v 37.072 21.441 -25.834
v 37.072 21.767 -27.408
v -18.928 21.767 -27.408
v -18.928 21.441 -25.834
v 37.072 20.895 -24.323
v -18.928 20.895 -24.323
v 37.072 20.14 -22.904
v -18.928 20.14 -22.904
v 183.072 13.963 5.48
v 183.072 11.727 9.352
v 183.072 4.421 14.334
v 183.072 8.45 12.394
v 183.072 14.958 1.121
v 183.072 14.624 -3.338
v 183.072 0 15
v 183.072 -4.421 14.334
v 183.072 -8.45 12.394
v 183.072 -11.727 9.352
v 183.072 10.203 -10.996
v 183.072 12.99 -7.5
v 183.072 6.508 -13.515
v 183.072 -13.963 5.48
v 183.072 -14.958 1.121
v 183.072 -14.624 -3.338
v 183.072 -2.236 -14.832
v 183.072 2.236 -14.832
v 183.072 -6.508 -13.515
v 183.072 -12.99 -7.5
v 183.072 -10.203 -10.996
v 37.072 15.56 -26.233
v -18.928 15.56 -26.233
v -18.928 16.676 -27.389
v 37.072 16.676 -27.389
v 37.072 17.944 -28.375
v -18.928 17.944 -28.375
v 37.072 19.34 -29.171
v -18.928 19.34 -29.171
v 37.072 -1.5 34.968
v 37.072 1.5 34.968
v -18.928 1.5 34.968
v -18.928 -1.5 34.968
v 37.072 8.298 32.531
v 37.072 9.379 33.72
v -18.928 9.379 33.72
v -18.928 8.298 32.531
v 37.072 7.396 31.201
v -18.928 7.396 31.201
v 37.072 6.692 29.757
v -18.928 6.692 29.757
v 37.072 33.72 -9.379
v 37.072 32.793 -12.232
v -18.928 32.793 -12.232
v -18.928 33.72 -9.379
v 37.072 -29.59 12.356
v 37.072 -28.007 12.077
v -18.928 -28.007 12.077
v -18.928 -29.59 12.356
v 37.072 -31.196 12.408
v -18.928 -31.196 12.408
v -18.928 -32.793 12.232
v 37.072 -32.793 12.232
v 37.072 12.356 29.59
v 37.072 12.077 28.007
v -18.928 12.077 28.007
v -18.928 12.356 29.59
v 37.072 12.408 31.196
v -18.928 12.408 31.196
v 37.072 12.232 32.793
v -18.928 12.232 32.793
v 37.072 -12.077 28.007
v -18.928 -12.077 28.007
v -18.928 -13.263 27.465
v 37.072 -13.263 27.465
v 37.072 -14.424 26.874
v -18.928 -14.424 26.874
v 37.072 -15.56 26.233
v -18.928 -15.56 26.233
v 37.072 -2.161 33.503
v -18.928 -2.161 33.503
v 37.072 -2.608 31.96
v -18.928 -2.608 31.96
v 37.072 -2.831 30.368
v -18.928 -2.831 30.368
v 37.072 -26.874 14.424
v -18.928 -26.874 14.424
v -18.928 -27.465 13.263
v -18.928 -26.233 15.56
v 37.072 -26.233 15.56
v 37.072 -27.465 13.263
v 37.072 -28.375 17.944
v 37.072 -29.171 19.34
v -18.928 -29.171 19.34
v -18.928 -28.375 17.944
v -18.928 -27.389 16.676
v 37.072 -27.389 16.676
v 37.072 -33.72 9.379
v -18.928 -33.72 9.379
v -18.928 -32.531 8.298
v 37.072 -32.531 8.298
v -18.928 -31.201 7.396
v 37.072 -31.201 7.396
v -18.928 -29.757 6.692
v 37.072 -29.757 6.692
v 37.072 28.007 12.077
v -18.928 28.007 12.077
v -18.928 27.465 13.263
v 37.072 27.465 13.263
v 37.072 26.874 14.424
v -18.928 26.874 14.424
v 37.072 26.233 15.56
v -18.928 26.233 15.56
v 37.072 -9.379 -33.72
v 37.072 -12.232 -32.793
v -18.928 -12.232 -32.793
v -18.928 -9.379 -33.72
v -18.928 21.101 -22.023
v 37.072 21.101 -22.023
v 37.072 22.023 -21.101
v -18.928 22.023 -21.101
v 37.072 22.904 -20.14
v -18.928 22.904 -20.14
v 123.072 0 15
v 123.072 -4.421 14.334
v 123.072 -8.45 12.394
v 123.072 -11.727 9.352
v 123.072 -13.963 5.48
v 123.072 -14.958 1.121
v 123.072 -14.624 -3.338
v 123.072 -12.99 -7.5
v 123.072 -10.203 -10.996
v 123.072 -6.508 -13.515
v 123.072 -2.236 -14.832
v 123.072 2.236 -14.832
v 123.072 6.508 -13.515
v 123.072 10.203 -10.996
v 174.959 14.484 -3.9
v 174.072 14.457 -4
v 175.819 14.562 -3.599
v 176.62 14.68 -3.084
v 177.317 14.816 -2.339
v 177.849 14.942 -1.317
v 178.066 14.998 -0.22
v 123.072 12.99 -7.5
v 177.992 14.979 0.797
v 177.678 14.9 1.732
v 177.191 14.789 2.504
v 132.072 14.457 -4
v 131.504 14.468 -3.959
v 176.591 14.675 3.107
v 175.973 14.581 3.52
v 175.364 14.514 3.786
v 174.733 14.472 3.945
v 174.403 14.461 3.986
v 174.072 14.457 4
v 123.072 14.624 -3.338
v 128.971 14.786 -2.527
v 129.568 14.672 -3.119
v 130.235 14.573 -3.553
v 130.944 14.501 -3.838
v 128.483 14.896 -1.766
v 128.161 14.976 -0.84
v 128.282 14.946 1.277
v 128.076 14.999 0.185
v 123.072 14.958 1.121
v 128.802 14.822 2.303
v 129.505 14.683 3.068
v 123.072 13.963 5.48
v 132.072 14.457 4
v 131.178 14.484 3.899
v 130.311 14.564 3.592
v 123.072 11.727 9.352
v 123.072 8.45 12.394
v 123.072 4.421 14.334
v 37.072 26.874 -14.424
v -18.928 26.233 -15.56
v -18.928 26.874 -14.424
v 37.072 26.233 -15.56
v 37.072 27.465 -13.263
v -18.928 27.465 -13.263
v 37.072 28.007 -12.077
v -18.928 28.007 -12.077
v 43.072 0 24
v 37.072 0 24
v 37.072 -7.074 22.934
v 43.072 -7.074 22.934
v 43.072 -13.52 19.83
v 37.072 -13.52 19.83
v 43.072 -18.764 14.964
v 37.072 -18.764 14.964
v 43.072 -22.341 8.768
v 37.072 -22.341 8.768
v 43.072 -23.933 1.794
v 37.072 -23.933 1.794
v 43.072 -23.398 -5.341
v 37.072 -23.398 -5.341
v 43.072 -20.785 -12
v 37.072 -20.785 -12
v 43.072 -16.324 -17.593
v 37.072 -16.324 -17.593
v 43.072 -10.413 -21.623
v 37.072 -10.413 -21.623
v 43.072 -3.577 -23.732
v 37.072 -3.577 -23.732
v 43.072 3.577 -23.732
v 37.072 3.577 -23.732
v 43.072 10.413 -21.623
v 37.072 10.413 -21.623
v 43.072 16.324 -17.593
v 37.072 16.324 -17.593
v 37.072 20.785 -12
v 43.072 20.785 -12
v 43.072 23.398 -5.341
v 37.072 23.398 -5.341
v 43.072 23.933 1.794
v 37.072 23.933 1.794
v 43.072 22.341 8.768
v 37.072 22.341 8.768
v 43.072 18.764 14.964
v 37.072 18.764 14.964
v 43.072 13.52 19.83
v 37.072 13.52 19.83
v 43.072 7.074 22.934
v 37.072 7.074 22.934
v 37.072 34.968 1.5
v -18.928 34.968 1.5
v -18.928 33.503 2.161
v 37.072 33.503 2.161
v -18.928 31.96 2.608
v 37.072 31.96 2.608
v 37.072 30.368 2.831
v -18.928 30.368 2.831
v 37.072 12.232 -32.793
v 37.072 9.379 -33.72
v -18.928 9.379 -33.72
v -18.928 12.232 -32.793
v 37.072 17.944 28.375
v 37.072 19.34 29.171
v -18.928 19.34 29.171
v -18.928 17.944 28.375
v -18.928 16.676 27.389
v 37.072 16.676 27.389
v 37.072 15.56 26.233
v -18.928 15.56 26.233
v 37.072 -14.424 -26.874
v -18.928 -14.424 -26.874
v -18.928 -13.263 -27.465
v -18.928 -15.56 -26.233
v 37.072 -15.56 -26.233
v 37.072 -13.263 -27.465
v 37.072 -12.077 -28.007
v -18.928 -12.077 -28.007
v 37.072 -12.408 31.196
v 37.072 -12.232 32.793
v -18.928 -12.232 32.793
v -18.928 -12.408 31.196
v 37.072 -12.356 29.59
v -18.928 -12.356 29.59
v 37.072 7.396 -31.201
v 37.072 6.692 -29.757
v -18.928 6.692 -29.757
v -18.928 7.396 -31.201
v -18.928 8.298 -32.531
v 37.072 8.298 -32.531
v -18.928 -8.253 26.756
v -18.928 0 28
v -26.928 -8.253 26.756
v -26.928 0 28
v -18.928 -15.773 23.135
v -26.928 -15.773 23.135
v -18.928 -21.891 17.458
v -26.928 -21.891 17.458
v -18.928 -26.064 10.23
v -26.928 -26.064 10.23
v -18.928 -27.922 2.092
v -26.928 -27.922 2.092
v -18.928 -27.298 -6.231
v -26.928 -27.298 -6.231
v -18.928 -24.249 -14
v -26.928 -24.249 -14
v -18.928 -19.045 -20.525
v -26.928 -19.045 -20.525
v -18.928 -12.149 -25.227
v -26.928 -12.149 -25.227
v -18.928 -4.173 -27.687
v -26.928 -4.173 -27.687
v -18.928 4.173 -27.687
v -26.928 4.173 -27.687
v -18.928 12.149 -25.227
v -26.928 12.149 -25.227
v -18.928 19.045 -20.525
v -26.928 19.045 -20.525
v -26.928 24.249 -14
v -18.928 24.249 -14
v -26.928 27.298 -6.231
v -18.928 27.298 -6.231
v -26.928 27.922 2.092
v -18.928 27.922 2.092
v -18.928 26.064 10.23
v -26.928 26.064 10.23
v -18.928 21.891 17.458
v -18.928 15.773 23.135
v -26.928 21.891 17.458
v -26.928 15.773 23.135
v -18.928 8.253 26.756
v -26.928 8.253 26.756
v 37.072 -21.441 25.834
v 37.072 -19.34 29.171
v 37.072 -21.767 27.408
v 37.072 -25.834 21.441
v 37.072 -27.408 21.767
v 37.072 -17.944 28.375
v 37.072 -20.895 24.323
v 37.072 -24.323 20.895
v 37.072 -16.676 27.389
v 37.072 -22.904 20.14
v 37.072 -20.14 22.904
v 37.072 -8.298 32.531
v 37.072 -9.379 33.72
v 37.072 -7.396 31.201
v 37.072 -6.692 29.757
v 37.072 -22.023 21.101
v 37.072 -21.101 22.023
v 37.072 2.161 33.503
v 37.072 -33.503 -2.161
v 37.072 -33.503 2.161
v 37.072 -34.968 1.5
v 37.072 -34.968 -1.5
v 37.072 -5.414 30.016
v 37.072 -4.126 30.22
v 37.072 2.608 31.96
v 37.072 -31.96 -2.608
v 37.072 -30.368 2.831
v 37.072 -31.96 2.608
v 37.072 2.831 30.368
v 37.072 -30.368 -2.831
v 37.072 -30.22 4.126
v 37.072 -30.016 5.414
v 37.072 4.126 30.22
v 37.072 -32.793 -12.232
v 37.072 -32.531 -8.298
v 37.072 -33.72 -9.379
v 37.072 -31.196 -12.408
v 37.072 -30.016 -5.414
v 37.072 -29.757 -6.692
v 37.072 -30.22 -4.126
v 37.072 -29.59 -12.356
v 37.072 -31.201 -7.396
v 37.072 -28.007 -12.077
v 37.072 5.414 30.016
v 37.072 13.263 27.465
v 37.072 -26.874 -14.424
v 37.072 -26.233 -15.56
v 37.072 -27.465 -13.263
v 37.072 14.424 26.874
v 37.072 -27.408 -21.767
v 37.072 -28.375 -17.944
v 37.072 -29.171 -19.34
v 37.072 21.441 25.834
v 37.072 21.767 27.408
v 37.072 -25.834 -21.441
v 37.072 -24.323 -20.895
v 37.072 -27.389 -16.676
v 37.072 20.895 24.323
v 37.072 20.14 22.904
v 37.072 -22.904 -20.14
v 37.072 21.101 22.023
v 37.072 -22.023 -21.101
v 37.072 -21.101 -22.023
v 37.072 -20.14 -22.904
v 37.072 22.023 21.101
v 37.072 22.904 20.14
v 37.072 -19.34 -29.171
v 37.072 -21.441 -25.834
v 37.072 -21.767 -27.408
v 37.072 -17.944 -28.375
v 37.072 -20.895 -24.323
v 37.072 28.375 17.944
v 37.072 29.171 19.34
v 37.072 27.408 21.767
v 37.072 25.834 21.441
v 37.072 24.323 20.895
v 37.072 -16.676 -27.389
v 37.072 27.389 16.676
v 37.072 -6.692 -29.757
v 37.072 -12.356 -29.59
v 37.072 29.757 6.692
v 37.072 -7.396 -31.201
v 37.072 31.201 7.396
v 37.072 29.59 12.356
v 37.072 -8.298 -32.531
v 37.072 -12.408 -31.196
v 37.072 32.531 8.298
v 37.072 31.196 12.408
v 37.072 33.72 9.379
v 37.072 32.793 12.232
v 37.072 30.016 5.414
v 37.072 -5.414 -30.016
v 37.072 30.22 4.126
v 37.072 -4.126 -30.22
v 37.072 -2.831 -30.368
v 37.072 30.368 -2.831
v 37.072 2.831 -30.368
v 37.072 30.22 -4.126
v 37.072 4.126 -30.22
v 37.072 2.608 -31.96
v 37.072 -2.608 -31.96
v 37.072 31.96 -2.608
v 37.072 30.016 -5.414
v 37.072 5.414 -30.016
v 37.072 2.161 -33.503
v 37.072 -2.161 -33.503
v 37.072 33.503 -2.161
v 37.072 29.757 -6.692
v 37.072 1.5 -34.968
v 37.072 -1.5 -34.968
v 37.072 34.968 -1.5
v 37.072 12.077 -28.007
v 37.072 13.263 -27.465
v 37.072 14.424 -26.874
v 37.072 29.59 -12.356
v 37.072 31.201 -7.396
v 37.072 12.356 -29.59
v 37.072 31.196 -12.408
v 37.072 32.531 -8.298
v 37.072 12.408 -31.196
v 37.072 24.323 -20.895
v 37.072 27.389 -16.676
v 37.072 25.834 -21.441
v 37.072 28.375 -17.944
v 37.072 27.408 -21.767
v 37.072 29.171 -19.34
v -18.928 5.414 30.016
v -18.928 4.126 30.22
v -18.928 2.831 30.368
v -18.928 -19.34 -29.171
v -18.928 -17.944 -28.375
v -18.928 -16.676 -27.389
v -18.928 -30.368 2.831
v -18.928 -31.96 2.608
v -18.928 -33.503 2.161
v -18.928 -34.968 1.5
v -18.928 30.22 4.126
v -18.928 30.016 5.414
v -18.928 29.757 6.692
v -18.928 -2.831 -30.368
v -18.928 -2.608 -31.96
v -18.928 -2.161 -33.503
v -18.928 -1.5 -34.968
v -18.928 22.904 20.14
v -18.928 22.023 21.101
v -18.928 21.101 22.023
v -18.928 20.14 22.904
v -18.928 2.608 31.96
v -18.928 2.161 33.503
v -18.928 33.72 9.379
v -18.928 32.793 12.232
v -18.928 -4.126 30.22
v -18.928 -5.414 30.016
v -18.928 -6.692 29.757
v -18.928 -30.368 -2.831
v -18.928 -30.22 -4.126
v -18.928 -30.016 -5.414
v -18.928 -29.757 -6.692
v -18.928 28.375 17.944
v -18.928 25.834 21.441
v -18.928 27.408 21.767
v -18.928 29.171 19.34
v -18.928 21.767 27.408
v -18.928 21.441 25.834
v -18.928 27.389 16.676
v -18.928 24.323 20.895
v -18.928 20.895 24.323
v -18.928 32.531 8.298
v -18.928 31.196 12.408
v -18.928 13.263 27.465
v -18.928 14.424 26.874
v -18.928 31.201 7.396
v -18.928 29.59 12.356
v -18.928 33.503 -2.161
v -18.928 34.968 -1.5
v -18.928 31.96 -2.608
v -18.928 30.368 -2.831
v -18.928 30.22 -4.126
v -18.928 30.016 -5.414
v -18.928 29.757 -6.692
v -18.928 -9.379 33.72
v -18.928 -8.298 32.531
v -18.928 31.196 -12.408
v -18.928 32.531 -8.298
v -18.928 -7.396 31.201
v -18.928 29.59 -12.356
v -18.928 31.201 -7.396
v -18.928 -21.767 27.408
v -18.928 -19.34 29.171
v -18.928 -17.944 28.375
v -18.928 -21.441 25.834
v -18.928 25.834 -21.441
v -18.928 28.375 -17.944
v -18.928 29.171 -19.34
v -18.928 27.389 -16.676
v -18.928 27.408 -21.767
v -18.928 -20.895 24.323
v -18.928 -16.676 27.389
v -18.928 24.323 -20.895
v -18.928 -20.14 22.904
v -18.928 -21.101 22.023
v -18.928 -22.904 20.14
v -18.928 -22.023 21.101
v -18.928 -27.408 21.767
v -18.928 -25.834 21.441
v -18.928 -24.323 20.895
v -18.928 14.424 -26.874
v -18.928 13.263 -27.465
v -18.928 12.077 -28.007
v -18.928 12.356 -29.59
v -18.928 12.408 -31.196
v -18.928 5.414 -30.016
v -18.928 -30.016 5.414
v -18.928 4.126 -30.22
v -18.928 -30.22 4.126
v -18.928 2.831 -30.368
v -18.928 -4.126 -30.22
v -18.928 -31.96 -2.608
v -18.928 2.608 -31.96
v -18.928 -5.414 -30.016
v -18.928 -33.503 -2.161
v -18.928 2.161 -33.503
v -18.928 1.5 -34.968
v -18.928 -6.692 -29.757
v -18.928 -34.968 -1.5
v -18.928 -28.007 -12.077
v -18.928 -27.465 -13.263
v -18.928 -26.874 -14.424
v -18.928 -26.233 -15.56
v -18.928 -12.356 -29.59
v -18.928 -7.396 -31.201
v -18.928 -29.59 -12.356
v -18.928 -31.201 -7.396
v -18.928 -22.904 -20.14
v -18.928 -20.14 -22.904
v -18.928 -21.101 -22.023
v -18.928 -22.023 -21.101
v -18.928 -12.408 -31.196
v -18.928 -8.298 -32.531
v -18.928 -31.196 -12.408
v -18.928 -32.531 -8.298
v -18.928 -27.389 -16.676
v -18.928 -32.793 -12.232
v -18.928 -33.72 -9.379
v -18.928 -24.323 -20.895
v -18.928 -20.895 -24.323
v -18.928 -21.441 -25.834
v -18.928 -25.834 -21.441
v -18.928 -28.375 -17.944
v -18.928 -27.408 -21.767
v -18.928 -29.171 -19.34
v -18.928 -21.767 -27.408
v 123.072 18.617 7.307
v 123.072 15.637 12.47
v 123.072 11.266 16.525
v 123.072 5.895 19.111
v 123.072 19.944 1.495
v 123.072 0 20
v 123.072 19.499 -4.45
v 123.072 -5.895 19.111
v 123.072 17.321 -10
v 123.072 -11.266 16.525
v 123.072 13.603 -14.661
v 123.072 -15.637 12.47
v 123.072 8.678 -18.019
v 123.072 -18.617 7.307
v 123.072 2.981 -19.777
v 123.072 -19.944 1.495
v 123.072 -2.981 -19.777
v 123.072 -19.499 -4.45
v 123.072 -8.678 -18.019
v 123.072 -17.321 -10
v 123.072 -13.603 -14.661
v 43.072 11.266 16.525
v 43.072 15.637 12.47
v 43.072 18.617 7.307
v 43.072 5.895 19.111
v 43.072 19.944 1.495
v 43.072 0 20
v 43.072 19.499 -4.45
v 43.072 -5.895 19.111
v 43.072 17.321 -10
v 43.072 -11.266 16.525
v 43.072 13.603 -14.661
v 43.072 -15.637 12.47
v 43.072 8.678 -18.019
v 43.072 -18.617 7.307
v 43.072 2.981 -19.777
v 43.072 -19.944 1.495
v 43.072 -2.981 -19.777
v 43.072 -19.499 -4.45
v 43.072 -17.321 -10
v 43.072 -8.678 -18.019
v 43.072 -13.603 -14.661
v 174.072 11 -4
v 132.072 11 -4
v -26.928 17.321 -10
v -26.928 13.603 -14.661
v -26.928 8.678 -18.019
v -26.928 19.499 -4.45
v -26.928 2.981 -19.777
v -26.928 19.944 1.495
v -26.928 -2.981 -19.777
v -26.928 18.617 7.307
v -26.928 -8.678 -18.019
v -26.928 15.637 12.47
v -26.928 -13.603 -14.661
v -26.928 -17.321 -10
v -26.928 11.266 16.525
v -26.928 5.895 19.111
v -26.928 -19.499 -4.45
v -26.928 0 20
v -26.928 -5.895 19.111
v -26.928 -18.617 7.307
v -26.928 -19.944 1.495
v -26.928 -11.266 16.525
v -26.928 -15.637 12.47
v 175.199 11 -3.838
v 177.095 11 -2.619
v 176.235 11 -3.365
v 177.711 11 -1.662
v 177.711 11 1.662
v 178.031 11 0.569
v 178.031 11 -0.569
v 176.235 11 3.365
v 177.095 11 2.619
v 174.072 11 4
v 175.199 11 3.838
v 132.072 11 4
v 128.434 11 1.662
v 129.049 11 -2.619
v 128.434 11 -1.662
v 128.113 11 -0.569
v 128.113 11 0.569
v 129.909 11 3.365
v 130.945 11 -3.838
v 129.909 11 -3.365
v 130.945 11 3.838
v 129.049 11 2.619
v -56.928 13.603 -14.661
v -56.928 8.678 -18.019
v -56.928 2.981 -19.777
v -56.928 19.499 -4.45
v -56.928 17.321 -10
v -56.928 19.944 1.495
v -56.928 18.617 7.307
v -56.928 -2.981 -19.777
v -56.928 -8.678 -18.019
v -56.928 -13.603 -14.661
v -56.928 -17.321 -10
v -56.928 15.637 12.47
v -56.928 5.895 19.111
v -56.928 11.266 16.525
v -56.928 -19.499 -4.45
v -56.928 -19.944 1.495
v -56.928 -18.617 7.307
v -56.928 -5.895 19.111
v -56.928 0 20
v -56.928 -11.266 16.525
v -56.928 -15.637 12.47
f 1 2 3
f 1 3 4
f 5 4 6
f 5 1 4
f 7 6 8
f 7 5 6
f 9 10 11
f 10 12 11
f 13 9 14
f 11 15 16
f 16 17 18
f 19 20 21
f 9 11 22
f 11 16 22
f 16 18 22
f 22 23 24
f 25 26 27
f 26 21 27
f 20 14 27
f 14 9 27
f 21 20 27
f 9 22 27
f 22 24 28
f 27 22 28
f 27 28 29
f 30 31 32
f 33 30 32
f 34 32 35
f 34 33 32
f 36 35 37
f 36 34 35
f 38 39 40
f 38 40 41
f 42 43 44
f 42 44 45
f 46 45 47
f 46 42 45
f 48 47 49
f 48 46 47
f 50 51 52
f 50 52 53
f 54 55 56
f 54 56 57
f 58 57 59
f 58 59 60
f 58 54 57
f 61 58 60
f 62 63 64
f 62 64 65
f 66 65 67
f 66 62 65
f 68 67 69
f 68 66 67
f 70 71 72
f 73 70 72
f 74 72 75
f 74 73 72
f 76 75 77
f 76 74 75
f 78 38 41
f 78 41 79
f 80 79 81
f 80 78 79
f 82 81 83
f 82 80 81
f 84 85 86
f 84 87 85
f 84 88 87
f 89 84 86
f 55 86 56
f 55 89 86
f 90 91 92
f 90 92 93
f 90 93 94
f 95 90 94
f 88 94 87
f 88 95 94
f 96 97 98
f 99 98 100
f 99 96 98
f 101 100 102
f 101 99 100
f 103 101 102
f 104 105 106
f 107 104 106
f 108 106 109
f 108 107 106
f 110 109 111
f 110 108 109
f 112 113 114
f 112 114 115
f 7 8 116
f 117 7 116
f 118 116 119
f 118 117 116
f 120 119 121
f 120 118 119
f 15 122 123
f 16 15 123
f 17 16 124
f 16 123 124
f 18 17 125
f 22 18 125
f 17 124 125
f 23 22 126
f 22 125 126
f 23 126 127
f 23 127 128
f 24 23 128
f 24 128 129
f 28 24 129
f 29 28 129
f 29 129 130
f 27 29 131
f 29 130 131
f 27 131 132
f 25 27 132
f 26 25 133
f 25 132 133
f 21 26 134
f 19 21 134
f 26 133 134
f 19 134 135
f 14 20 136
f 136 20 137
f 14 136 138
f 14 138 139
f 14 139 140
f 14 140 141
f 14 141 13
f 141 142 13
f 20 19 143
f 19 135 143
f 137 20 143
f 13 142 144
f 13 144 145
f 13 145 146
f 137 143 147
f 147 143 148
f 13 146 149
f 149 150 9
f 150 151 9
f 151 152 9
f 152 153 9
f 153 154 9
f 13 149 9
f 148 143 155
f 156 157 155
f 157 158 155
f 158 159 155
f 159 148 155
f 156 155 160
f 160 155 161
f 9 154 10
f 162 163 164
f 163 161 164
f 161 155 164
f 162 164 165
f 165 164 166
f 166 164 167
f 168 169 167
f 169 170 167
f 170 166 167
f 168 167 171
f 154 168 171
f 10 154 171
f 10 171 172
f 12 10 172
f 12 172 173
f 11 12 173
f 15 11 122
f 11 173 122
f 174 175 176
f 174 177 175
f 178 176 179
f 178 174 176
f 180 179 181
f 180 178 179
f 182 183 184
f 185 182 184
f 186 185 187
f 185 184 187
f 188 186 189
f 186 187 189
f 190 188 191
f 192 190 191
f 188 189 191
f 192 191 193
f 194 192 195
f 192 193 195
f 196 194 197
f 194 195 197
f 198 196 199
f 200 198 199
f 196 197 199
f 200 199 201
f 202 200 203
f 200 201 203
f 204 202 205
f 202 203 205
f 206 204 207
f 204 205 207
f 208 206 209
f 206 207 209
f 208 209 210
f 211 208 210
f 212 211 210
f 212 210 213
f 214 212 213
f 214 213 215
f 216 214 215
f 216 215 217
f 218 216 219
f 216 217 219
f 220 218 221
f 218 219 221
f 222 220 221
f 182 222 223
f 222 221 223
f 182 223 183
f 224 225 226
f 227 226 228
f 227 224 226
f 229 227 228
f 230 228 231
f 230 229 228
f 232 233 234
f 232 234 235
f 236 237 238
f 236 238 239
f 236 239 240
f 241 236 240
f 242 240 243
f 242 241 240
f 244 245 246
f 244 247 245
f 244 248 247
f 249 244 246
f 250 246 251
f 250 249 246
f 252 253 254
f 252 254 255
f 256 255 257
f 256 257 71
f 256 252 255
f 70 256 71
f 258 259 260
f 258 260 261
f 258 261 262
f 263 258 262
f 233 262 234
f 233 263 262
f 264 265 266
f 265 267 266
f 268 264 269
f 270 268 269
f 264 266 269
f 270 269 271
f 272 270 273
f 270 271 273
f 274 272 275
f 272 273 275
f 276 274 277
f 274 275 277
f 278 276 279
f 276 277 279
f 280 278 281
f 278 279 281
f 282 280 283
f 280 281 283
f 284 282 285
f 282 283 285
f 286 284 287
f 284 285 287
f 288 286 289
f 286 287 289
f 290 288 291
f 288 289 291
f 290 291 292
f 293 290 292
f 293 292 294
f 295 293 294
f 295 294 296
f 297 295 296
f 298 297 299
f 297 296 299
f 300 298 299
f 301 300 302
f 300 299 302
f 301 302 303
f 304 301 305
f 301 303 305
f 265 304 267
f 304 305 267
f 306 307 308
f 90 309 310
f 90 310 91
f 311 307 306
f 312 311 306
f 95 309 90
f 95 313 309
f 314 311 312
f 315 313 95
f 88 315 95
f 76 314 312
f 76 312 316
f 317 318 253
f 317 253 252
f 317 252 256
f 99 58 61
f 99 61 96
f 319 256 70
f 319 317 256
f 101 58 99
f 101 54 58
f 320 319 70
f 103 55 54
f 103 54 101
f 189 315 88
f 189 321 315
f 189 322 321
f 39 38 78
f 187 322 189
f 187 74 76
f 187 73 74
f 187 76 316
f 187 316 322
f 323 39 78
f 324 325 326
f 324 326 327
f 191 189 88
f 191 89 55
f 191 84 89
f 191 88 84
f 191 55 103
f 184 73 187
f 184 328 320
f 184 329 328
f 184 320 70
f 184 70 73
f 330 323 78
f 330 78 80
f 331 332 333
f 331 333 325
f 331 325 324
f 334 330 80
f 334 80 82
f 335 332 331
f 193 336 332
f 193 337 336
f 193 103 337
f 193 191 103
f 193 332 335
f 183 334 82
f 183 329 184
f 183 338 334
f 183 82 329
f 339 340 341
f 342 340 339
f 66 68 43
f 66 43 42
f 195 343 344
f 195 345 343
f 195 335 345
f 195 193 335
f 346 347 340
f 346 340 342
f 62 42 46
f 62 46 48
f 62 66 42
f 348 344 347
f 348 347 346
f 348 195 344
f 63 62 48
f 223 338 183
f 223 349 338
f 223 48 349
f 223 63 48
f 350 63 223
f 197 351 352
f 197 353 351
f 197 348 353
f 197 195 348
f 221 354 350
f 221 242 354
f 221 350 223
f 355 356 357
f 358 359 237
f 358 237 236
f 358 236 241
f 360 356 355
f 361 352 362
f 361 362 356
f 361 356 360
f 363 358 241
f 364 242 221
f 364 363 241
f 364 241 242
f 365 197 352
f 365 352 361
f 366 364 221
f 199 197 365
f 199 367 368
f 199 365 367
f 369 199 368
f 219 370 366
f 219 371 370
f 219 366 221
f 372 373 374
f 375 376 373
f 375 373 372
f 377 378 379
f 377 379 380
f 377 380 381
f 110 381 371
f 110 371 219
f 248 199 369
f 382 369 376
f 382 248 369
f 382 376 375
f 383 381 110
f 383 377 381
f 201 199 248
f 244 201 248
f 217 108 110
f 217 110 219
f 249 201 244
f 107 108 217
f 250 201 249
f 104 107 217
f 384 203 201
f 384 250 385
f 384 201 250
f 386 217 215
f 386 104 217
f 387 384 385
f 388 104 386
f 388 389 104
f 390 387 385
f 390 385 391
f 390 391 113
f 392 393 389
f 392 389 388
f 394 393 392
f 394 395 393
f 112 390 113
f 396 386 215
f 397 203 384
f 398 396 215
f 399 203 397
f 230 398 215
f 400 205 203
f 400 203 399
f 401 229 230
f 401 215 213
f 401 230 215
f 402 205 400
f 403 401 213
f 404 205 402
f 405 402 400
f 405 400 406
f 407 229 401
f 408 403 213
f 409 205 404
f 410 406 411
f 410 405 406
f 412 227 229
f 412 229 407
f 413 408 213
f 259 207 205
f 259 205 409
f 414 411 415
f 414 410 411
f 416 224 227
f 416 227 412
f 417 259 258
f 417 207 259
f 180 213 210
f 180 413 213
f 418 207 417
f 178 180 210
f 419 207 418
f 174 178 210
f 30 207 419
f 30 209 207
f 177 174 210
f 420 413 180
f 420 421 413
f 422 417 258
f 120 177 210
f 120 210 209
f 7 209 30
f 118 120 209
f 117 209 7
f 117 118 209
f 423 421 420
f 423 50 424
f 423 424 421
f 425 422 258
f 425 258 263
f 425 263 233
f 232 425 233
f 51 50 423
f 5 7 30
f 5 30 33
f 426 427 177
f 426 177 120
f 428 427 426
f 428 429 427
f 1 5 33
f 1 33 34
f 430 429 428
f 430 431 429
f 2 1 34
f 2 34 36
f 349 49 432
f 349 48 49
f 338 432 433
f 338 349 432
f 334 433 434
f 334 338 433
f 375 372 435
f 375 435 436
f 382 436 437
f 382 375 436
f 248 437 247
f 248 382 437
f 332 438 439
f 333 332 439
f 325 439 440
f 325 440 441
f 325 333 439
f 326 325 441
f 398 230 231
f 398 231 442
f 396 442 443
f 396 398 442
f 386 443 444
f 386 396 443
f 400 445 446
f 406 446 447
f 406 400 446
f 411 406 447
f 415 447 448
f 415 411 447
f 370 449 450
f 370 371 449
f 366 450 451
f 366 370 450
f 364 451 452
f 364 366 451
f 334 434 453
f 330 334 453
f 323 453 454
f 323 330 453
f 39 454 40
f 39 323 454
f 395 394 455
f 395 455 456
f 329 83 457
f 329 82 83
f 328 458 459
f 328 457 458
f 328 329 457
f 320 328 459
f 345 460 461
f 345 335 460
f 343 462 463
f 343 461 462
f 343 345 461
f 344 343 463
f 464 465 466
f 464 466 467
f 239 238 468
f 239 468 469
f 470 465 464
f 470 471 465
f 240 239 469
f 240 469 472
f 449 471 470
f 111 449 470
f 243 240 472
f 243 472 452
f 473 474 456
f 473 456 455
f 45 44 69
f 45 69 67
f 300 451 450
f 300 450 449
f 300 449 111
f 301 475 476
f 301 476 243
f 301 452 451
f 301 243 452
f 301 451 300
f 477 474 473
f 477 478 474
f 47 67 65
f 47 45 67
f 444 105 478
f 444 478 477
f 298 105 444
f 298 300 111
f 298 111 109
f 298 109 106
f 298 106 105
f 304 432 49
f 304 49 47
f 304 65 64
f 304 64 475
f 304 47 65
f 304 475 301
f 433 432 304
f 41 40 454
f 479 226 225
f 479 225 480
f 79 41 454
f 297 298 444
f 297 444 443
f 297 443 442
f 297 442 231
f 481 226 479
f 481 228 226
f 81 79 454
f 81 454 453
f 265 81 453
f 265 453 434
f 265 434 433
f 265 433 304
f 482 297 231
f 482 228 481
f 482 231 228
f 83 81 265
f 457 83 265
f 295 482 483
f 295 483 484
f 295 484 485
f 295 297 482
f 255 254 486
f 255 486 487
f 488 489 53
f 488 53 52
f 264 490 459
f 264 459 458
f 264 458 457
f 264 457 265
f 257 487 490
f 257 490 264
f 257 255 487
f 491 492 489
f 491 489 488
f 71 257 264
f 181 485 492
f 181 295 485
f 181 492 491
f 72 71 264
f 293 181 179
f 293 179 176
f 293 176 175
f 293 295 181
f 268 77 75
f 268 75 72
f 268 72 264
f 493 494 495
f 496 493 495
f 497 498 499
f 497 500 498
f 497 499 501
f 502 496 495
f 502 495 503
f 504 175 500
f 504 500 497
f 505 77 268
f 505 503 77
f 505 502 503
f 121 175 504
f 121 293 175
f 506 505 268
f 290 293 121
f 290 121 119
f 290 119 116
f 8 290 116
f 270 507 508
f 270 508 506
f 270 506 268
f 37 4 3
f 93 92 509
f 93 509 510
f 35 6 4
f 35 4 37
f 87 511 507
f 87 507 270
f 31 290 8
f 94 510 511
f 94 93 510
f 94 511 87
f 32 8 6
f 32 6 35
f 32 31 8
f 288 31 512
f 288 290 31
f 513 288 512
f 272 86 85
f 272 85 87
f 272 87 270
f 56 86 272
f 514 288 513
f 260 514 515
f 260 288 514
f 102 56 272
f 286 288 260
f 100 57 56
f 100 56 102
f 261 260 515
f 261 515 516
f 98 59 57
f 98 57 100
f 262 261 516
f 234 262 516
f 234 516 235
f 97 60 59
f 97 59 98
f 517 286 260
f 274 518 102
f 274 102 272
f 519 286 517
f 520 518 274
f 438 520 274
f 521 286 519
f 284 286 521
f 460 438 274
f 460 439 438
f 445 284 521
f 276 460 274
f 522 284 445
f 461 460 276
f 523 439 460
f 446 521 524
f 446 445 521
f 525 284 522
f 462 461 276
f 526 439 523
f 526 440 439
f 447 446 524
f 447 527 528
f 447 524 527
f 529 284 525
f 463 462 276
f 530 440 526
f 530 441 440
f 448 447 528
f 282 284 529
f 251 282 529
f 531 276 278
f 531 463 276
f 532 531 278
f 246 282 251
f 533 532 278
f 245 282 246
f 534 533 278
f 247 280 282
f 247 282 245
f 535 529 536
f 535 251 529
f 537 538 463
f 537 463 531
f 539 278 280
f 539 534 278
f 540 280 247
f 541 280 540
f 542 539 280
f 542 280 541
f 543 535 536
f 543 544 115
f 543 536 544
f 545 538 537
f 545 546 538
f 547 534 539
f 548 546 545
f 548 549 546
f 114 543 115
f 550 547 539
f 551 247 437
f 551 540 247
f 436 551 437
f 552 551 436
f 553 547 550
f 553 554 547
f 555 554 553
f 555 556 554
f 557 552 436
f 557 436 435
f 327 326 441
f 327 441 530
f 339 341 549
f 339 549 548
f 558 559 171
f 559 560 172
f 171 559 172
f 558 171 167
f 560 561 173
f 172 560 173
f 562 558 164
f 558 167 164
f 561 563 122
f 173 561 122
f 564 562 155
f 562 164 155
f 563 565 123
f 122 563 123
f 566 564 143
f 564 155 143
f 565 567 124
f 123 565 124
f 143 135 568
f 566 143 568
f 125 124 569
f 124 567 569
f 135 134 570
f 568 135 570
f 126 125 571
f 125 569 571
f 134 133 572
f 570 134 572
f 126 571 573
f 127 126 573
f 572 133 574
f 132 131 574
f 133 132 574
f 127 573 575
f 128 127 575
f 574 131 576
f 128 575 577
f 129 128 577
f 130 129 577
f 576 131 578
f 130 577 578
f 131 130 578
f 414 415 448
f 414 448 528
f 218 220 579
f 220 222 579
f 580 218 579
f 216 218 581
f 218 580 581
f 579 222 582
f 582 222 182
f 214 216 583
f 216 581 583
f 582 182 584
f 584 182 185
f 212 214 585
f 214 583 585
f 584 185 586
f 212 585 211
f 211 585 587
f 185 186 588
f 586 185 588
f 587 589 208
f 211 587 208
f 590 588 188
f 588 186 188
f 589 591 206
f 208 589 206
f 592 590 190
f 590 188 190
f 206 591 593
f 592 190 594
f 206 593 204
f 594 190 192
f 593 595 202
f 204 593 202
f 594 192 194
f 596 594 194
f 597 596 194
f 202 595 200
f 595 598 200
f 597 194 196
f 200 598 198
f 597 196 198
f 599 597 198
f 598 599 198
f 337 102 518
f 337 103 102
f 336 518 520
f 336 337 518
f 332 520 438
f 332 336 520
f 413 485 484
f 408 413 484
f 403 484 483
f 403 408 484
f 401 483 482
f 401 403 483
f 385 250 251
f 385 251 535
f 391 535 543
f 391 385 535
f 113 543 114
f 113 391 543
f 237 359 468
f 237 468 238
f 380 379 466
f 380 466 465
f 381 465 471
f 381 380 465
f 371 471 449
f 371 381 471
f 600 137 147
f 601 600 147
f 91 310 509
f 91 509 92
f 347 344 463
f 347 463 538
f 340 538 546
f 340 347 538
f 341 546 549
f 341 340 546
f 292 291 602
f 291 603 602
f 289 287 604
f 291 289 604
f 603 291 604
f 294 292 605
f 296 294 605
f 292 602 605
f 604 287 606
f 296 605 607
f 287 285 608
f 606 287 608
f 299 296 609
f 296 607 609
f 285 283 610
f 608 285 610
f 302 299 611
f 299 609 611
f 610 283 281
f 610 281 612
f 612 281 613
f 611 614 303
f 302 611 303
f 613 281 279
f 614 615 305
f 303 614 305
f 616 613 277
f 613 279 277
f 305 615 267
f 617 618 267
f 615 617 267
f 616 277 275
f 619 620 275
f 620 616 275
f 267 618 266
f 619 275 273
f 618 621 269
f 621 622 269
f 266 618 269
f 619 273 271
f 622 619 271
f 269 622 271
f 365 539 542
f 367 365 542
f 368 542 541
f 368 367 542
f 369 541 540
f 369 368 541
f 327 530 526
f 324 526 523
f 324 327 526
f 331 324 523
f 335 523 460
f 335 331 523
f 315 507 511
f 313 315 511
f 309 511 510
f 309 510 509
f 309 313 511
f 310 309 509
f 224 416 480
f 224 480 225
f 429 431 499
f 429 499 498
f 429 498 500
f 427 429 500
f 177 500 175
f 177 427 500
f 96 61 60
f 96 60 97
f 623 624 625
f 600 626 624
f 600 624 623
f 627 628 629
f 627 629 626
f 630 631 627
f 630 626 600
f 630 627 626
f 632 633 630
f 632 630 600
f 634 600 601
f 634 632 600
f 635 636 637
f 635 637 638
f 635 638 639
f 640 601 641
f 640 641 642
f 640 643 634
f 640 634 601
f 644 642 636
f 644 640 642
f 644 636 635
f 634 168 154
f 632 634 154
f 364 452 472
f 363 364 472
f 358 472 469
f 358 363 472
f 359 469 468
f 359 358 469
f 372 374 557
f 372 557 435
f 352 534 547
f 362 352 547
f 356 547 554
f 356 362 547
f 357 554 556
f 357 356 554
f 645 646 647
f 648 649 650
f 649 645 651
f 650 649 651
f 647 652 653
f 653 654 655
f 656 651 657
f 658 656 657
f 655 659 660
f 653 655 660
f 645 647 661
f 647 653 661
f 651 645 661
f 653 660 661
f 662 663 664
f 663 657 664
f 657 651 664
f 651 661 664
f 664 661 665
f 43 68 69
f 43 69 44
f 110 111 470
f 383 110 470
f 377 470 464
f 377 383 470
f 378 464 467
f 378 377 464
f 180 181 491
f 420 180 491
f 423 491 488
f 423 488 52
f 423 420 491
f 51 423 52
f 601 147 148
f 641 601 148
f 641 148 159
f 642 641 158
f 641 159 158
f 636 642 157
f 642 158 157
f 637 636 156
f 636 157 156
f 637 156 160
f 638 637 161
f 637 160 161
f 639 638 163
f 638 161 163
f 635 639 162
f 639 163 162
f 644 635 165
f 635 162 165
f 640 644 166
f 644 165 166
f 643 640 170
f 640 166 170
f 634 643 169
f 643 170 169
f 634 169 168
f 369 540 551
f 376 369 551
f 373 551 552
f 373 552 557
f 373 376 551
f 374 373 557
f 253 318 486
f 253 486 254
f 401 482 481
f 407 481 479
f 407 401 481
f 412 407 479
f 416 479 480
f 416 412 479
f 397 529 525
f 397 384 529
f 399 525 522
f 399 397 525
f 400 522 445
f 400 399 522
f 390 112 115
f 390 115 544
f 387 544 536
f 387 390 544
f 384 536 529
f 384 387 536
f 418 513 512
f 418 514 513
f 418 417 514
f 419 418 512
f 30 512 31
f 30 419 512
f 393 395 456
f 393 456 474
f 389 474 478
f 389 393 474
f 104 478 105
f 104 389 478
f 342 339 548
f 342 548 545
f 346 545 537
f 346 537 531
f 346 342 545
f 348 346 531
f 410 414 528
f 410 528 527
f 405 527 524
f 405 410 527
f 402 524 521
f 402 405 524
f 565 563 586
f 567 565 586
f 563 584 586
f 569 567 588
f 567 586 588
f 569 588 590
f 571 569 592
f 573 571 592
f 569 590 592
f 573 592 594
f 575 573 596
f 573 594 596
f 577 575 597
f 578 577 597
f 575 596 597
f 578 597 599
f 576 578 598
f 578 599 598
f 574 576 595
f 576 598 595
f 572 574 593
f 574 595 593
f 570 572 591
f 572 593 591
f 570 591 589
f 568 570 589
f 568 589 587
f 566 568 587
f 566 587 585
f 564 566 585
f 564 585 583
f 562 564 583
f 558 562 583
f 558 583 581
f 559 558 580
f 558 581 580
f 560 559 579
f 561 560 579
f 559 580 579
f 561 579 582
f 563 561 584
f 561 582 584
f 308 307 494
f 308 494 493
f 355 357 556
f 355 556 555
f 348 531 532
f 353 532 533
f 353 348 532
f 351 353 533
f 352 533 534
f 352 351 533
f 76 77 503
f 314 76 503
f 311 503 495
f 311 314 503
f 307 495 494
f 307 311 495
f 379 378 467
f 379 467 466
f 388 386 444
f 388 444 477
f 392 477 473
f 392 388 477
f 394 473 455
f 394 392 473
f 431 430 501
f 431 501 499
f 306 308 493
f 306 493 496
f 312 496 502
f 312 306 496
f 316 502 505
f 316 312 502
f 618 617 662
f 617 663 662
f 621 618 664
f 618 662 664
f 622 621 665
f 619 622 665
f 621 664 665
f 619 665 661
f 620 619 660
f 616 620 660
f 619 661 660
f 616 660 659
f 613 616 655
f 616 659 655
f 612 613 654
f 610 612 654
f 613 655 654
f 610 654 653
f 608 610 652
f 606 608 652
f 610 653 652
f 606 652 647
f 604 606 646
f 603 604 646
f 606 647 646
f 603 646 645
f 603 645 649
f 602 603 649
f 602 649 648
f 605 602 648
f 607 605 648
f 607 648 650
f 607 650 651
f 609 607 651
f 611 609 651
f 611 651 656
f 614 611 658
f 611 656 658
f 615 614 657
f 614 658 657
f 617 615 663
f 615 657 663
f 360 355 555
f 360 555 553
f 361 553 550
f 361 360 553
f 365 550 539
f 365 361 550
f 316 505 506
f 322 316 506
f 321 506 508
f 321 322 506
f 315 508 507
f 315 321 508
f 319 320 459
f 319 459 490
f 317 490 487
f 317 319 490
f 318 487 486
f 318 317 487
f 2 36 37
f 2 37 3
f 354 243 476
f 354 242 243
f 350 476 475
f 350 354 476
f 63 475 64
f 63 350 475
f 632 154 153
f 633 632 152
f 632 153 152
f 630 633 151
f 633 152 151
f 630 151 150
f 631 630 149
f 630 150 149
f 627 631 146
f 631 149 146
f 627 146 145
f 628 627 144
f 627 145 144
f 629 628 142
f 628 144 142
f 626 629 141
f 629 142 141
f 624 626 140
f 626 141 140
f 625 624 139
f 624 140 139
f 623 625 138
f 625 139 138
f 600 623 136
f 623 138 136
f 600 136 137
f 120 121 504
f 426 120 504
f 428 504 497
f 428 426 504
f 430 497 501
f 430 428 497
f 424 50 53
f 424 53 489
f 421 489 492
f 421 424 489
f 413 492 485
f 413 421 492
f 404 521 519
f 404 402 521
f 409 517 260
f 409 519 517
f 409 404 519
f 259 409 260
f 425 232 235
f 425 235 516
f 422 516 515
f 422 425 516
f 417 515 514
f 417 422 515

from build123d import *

# Parameters (mm, degrees)
CUT_EXTRUDE_1_DEPTH      = 4
SKETCH_3_W               = 56
SKETCH_3_H               = 6.5
EXTRUDE_1_DEPTH          = 56
PATTERN_CIRCULAR_1_COUNT = 20


with BuildPart() as part:
    # 草图1 → 旋转2 (revolve)
    with BuildSketch(Plane.XY, mode=Mode.PRIVATE) as revolve_2_sk:
        Polygon((-56.927945362, 0), (183.072054638, 0), (183.072054638, 15), (123.072054638, 15), (123.072054638, 20), (43.072054638, 20), (43.072054638, 24), (-18.927945362, 24), (-18.927945362, 28), (-26.927945362, 28), (-26.927945362, 20), (-56.927945362, 20), align=None)
    revolve(revolve_2_sk.sketch.rotate(Axis((-87.906104207, 0, 0), (1, 0, 0)), 90), axis=Axis((-87.906104207, 0, 0), (1, 0, 0)))

    # 草图2 → 切除-拉伸1 (cut)
    with BuildSketch(Plane(origin=(0, 15, 0), x_dir=(-1, 0, 0), z_dir=(0, 1, 0))):
        with BuildLine():
            Line((-174.072054638, -4), (-132.072054638, -4))
            ThreePointArc((-132.072054638, -4), (-128.072054638, 0), (-132.072054638, 4))
            Line((-132.072054638, 4), (-174.072054638, 4))
            ThreePointArc((-174.072054638, 4), (-178.072054638, 0), (-174.072054638, -4))
        make_face()
    extrude(amount=-CUT_EXTRUDE_1_DEPTH, mode=Mode.SUBTRACT)

    # 草图3 → 旋转4 (revolve)
    with BuildSketch(Plane.XY, mode=Mode.PRIVATE) as revolve_4_sk:
        with Locations((9.072054638, 27.25)):
            Rectangle(SKETCH_3_W, SKETCH_3_H)
    revolve(revolve_4_sk.sketch.rotate(Axis((-56.927945362, 0, 0), (1, 0, 0)), 90), axis=Axis((-56.927945362, 0, 0), (1, 0, 0)))

    # 草图5 → 凸台-拉伸1 (add)
    with BuildSketch(Plane(origin=(37.072054638, 0, 0), x_dir=(0, 0, -1), z_dir=(1, 0, 0))):
        with BuildLine():
            Line((-2.63562284, 27.368933751), (2.63562284, 27.368933751))
            ThreePointArc((2.63562284, 27.368933751), (2.733180603, 31.267824503), (1.5, 34.96784237))
            Line((1.5, 34.96784237), (-1.5, 34.96784237))
            ThreePointArc((-1.5, 34.96784237), (-2.733180603, 31.267824503), (-2.63562284, 27.368933751))
        make_face()
    extrude_1 = extrude(amount=-EXTRUDE_1_DEPTH)

    # 阵列(圆周)1: 凸台-拉伸1 ×20 about axis
    pattern_circular_1_axis = Axis((0, 0, 0), (1, 0, 0))
    for i in range(1, PATTERN_CIRCULAR_1_COUNT):
        add(extrude_1.rotate(pattern_circular_1_axis, i * 360 / PATTERN_CIRCULAR_1_COUNT))


solid = part.part
